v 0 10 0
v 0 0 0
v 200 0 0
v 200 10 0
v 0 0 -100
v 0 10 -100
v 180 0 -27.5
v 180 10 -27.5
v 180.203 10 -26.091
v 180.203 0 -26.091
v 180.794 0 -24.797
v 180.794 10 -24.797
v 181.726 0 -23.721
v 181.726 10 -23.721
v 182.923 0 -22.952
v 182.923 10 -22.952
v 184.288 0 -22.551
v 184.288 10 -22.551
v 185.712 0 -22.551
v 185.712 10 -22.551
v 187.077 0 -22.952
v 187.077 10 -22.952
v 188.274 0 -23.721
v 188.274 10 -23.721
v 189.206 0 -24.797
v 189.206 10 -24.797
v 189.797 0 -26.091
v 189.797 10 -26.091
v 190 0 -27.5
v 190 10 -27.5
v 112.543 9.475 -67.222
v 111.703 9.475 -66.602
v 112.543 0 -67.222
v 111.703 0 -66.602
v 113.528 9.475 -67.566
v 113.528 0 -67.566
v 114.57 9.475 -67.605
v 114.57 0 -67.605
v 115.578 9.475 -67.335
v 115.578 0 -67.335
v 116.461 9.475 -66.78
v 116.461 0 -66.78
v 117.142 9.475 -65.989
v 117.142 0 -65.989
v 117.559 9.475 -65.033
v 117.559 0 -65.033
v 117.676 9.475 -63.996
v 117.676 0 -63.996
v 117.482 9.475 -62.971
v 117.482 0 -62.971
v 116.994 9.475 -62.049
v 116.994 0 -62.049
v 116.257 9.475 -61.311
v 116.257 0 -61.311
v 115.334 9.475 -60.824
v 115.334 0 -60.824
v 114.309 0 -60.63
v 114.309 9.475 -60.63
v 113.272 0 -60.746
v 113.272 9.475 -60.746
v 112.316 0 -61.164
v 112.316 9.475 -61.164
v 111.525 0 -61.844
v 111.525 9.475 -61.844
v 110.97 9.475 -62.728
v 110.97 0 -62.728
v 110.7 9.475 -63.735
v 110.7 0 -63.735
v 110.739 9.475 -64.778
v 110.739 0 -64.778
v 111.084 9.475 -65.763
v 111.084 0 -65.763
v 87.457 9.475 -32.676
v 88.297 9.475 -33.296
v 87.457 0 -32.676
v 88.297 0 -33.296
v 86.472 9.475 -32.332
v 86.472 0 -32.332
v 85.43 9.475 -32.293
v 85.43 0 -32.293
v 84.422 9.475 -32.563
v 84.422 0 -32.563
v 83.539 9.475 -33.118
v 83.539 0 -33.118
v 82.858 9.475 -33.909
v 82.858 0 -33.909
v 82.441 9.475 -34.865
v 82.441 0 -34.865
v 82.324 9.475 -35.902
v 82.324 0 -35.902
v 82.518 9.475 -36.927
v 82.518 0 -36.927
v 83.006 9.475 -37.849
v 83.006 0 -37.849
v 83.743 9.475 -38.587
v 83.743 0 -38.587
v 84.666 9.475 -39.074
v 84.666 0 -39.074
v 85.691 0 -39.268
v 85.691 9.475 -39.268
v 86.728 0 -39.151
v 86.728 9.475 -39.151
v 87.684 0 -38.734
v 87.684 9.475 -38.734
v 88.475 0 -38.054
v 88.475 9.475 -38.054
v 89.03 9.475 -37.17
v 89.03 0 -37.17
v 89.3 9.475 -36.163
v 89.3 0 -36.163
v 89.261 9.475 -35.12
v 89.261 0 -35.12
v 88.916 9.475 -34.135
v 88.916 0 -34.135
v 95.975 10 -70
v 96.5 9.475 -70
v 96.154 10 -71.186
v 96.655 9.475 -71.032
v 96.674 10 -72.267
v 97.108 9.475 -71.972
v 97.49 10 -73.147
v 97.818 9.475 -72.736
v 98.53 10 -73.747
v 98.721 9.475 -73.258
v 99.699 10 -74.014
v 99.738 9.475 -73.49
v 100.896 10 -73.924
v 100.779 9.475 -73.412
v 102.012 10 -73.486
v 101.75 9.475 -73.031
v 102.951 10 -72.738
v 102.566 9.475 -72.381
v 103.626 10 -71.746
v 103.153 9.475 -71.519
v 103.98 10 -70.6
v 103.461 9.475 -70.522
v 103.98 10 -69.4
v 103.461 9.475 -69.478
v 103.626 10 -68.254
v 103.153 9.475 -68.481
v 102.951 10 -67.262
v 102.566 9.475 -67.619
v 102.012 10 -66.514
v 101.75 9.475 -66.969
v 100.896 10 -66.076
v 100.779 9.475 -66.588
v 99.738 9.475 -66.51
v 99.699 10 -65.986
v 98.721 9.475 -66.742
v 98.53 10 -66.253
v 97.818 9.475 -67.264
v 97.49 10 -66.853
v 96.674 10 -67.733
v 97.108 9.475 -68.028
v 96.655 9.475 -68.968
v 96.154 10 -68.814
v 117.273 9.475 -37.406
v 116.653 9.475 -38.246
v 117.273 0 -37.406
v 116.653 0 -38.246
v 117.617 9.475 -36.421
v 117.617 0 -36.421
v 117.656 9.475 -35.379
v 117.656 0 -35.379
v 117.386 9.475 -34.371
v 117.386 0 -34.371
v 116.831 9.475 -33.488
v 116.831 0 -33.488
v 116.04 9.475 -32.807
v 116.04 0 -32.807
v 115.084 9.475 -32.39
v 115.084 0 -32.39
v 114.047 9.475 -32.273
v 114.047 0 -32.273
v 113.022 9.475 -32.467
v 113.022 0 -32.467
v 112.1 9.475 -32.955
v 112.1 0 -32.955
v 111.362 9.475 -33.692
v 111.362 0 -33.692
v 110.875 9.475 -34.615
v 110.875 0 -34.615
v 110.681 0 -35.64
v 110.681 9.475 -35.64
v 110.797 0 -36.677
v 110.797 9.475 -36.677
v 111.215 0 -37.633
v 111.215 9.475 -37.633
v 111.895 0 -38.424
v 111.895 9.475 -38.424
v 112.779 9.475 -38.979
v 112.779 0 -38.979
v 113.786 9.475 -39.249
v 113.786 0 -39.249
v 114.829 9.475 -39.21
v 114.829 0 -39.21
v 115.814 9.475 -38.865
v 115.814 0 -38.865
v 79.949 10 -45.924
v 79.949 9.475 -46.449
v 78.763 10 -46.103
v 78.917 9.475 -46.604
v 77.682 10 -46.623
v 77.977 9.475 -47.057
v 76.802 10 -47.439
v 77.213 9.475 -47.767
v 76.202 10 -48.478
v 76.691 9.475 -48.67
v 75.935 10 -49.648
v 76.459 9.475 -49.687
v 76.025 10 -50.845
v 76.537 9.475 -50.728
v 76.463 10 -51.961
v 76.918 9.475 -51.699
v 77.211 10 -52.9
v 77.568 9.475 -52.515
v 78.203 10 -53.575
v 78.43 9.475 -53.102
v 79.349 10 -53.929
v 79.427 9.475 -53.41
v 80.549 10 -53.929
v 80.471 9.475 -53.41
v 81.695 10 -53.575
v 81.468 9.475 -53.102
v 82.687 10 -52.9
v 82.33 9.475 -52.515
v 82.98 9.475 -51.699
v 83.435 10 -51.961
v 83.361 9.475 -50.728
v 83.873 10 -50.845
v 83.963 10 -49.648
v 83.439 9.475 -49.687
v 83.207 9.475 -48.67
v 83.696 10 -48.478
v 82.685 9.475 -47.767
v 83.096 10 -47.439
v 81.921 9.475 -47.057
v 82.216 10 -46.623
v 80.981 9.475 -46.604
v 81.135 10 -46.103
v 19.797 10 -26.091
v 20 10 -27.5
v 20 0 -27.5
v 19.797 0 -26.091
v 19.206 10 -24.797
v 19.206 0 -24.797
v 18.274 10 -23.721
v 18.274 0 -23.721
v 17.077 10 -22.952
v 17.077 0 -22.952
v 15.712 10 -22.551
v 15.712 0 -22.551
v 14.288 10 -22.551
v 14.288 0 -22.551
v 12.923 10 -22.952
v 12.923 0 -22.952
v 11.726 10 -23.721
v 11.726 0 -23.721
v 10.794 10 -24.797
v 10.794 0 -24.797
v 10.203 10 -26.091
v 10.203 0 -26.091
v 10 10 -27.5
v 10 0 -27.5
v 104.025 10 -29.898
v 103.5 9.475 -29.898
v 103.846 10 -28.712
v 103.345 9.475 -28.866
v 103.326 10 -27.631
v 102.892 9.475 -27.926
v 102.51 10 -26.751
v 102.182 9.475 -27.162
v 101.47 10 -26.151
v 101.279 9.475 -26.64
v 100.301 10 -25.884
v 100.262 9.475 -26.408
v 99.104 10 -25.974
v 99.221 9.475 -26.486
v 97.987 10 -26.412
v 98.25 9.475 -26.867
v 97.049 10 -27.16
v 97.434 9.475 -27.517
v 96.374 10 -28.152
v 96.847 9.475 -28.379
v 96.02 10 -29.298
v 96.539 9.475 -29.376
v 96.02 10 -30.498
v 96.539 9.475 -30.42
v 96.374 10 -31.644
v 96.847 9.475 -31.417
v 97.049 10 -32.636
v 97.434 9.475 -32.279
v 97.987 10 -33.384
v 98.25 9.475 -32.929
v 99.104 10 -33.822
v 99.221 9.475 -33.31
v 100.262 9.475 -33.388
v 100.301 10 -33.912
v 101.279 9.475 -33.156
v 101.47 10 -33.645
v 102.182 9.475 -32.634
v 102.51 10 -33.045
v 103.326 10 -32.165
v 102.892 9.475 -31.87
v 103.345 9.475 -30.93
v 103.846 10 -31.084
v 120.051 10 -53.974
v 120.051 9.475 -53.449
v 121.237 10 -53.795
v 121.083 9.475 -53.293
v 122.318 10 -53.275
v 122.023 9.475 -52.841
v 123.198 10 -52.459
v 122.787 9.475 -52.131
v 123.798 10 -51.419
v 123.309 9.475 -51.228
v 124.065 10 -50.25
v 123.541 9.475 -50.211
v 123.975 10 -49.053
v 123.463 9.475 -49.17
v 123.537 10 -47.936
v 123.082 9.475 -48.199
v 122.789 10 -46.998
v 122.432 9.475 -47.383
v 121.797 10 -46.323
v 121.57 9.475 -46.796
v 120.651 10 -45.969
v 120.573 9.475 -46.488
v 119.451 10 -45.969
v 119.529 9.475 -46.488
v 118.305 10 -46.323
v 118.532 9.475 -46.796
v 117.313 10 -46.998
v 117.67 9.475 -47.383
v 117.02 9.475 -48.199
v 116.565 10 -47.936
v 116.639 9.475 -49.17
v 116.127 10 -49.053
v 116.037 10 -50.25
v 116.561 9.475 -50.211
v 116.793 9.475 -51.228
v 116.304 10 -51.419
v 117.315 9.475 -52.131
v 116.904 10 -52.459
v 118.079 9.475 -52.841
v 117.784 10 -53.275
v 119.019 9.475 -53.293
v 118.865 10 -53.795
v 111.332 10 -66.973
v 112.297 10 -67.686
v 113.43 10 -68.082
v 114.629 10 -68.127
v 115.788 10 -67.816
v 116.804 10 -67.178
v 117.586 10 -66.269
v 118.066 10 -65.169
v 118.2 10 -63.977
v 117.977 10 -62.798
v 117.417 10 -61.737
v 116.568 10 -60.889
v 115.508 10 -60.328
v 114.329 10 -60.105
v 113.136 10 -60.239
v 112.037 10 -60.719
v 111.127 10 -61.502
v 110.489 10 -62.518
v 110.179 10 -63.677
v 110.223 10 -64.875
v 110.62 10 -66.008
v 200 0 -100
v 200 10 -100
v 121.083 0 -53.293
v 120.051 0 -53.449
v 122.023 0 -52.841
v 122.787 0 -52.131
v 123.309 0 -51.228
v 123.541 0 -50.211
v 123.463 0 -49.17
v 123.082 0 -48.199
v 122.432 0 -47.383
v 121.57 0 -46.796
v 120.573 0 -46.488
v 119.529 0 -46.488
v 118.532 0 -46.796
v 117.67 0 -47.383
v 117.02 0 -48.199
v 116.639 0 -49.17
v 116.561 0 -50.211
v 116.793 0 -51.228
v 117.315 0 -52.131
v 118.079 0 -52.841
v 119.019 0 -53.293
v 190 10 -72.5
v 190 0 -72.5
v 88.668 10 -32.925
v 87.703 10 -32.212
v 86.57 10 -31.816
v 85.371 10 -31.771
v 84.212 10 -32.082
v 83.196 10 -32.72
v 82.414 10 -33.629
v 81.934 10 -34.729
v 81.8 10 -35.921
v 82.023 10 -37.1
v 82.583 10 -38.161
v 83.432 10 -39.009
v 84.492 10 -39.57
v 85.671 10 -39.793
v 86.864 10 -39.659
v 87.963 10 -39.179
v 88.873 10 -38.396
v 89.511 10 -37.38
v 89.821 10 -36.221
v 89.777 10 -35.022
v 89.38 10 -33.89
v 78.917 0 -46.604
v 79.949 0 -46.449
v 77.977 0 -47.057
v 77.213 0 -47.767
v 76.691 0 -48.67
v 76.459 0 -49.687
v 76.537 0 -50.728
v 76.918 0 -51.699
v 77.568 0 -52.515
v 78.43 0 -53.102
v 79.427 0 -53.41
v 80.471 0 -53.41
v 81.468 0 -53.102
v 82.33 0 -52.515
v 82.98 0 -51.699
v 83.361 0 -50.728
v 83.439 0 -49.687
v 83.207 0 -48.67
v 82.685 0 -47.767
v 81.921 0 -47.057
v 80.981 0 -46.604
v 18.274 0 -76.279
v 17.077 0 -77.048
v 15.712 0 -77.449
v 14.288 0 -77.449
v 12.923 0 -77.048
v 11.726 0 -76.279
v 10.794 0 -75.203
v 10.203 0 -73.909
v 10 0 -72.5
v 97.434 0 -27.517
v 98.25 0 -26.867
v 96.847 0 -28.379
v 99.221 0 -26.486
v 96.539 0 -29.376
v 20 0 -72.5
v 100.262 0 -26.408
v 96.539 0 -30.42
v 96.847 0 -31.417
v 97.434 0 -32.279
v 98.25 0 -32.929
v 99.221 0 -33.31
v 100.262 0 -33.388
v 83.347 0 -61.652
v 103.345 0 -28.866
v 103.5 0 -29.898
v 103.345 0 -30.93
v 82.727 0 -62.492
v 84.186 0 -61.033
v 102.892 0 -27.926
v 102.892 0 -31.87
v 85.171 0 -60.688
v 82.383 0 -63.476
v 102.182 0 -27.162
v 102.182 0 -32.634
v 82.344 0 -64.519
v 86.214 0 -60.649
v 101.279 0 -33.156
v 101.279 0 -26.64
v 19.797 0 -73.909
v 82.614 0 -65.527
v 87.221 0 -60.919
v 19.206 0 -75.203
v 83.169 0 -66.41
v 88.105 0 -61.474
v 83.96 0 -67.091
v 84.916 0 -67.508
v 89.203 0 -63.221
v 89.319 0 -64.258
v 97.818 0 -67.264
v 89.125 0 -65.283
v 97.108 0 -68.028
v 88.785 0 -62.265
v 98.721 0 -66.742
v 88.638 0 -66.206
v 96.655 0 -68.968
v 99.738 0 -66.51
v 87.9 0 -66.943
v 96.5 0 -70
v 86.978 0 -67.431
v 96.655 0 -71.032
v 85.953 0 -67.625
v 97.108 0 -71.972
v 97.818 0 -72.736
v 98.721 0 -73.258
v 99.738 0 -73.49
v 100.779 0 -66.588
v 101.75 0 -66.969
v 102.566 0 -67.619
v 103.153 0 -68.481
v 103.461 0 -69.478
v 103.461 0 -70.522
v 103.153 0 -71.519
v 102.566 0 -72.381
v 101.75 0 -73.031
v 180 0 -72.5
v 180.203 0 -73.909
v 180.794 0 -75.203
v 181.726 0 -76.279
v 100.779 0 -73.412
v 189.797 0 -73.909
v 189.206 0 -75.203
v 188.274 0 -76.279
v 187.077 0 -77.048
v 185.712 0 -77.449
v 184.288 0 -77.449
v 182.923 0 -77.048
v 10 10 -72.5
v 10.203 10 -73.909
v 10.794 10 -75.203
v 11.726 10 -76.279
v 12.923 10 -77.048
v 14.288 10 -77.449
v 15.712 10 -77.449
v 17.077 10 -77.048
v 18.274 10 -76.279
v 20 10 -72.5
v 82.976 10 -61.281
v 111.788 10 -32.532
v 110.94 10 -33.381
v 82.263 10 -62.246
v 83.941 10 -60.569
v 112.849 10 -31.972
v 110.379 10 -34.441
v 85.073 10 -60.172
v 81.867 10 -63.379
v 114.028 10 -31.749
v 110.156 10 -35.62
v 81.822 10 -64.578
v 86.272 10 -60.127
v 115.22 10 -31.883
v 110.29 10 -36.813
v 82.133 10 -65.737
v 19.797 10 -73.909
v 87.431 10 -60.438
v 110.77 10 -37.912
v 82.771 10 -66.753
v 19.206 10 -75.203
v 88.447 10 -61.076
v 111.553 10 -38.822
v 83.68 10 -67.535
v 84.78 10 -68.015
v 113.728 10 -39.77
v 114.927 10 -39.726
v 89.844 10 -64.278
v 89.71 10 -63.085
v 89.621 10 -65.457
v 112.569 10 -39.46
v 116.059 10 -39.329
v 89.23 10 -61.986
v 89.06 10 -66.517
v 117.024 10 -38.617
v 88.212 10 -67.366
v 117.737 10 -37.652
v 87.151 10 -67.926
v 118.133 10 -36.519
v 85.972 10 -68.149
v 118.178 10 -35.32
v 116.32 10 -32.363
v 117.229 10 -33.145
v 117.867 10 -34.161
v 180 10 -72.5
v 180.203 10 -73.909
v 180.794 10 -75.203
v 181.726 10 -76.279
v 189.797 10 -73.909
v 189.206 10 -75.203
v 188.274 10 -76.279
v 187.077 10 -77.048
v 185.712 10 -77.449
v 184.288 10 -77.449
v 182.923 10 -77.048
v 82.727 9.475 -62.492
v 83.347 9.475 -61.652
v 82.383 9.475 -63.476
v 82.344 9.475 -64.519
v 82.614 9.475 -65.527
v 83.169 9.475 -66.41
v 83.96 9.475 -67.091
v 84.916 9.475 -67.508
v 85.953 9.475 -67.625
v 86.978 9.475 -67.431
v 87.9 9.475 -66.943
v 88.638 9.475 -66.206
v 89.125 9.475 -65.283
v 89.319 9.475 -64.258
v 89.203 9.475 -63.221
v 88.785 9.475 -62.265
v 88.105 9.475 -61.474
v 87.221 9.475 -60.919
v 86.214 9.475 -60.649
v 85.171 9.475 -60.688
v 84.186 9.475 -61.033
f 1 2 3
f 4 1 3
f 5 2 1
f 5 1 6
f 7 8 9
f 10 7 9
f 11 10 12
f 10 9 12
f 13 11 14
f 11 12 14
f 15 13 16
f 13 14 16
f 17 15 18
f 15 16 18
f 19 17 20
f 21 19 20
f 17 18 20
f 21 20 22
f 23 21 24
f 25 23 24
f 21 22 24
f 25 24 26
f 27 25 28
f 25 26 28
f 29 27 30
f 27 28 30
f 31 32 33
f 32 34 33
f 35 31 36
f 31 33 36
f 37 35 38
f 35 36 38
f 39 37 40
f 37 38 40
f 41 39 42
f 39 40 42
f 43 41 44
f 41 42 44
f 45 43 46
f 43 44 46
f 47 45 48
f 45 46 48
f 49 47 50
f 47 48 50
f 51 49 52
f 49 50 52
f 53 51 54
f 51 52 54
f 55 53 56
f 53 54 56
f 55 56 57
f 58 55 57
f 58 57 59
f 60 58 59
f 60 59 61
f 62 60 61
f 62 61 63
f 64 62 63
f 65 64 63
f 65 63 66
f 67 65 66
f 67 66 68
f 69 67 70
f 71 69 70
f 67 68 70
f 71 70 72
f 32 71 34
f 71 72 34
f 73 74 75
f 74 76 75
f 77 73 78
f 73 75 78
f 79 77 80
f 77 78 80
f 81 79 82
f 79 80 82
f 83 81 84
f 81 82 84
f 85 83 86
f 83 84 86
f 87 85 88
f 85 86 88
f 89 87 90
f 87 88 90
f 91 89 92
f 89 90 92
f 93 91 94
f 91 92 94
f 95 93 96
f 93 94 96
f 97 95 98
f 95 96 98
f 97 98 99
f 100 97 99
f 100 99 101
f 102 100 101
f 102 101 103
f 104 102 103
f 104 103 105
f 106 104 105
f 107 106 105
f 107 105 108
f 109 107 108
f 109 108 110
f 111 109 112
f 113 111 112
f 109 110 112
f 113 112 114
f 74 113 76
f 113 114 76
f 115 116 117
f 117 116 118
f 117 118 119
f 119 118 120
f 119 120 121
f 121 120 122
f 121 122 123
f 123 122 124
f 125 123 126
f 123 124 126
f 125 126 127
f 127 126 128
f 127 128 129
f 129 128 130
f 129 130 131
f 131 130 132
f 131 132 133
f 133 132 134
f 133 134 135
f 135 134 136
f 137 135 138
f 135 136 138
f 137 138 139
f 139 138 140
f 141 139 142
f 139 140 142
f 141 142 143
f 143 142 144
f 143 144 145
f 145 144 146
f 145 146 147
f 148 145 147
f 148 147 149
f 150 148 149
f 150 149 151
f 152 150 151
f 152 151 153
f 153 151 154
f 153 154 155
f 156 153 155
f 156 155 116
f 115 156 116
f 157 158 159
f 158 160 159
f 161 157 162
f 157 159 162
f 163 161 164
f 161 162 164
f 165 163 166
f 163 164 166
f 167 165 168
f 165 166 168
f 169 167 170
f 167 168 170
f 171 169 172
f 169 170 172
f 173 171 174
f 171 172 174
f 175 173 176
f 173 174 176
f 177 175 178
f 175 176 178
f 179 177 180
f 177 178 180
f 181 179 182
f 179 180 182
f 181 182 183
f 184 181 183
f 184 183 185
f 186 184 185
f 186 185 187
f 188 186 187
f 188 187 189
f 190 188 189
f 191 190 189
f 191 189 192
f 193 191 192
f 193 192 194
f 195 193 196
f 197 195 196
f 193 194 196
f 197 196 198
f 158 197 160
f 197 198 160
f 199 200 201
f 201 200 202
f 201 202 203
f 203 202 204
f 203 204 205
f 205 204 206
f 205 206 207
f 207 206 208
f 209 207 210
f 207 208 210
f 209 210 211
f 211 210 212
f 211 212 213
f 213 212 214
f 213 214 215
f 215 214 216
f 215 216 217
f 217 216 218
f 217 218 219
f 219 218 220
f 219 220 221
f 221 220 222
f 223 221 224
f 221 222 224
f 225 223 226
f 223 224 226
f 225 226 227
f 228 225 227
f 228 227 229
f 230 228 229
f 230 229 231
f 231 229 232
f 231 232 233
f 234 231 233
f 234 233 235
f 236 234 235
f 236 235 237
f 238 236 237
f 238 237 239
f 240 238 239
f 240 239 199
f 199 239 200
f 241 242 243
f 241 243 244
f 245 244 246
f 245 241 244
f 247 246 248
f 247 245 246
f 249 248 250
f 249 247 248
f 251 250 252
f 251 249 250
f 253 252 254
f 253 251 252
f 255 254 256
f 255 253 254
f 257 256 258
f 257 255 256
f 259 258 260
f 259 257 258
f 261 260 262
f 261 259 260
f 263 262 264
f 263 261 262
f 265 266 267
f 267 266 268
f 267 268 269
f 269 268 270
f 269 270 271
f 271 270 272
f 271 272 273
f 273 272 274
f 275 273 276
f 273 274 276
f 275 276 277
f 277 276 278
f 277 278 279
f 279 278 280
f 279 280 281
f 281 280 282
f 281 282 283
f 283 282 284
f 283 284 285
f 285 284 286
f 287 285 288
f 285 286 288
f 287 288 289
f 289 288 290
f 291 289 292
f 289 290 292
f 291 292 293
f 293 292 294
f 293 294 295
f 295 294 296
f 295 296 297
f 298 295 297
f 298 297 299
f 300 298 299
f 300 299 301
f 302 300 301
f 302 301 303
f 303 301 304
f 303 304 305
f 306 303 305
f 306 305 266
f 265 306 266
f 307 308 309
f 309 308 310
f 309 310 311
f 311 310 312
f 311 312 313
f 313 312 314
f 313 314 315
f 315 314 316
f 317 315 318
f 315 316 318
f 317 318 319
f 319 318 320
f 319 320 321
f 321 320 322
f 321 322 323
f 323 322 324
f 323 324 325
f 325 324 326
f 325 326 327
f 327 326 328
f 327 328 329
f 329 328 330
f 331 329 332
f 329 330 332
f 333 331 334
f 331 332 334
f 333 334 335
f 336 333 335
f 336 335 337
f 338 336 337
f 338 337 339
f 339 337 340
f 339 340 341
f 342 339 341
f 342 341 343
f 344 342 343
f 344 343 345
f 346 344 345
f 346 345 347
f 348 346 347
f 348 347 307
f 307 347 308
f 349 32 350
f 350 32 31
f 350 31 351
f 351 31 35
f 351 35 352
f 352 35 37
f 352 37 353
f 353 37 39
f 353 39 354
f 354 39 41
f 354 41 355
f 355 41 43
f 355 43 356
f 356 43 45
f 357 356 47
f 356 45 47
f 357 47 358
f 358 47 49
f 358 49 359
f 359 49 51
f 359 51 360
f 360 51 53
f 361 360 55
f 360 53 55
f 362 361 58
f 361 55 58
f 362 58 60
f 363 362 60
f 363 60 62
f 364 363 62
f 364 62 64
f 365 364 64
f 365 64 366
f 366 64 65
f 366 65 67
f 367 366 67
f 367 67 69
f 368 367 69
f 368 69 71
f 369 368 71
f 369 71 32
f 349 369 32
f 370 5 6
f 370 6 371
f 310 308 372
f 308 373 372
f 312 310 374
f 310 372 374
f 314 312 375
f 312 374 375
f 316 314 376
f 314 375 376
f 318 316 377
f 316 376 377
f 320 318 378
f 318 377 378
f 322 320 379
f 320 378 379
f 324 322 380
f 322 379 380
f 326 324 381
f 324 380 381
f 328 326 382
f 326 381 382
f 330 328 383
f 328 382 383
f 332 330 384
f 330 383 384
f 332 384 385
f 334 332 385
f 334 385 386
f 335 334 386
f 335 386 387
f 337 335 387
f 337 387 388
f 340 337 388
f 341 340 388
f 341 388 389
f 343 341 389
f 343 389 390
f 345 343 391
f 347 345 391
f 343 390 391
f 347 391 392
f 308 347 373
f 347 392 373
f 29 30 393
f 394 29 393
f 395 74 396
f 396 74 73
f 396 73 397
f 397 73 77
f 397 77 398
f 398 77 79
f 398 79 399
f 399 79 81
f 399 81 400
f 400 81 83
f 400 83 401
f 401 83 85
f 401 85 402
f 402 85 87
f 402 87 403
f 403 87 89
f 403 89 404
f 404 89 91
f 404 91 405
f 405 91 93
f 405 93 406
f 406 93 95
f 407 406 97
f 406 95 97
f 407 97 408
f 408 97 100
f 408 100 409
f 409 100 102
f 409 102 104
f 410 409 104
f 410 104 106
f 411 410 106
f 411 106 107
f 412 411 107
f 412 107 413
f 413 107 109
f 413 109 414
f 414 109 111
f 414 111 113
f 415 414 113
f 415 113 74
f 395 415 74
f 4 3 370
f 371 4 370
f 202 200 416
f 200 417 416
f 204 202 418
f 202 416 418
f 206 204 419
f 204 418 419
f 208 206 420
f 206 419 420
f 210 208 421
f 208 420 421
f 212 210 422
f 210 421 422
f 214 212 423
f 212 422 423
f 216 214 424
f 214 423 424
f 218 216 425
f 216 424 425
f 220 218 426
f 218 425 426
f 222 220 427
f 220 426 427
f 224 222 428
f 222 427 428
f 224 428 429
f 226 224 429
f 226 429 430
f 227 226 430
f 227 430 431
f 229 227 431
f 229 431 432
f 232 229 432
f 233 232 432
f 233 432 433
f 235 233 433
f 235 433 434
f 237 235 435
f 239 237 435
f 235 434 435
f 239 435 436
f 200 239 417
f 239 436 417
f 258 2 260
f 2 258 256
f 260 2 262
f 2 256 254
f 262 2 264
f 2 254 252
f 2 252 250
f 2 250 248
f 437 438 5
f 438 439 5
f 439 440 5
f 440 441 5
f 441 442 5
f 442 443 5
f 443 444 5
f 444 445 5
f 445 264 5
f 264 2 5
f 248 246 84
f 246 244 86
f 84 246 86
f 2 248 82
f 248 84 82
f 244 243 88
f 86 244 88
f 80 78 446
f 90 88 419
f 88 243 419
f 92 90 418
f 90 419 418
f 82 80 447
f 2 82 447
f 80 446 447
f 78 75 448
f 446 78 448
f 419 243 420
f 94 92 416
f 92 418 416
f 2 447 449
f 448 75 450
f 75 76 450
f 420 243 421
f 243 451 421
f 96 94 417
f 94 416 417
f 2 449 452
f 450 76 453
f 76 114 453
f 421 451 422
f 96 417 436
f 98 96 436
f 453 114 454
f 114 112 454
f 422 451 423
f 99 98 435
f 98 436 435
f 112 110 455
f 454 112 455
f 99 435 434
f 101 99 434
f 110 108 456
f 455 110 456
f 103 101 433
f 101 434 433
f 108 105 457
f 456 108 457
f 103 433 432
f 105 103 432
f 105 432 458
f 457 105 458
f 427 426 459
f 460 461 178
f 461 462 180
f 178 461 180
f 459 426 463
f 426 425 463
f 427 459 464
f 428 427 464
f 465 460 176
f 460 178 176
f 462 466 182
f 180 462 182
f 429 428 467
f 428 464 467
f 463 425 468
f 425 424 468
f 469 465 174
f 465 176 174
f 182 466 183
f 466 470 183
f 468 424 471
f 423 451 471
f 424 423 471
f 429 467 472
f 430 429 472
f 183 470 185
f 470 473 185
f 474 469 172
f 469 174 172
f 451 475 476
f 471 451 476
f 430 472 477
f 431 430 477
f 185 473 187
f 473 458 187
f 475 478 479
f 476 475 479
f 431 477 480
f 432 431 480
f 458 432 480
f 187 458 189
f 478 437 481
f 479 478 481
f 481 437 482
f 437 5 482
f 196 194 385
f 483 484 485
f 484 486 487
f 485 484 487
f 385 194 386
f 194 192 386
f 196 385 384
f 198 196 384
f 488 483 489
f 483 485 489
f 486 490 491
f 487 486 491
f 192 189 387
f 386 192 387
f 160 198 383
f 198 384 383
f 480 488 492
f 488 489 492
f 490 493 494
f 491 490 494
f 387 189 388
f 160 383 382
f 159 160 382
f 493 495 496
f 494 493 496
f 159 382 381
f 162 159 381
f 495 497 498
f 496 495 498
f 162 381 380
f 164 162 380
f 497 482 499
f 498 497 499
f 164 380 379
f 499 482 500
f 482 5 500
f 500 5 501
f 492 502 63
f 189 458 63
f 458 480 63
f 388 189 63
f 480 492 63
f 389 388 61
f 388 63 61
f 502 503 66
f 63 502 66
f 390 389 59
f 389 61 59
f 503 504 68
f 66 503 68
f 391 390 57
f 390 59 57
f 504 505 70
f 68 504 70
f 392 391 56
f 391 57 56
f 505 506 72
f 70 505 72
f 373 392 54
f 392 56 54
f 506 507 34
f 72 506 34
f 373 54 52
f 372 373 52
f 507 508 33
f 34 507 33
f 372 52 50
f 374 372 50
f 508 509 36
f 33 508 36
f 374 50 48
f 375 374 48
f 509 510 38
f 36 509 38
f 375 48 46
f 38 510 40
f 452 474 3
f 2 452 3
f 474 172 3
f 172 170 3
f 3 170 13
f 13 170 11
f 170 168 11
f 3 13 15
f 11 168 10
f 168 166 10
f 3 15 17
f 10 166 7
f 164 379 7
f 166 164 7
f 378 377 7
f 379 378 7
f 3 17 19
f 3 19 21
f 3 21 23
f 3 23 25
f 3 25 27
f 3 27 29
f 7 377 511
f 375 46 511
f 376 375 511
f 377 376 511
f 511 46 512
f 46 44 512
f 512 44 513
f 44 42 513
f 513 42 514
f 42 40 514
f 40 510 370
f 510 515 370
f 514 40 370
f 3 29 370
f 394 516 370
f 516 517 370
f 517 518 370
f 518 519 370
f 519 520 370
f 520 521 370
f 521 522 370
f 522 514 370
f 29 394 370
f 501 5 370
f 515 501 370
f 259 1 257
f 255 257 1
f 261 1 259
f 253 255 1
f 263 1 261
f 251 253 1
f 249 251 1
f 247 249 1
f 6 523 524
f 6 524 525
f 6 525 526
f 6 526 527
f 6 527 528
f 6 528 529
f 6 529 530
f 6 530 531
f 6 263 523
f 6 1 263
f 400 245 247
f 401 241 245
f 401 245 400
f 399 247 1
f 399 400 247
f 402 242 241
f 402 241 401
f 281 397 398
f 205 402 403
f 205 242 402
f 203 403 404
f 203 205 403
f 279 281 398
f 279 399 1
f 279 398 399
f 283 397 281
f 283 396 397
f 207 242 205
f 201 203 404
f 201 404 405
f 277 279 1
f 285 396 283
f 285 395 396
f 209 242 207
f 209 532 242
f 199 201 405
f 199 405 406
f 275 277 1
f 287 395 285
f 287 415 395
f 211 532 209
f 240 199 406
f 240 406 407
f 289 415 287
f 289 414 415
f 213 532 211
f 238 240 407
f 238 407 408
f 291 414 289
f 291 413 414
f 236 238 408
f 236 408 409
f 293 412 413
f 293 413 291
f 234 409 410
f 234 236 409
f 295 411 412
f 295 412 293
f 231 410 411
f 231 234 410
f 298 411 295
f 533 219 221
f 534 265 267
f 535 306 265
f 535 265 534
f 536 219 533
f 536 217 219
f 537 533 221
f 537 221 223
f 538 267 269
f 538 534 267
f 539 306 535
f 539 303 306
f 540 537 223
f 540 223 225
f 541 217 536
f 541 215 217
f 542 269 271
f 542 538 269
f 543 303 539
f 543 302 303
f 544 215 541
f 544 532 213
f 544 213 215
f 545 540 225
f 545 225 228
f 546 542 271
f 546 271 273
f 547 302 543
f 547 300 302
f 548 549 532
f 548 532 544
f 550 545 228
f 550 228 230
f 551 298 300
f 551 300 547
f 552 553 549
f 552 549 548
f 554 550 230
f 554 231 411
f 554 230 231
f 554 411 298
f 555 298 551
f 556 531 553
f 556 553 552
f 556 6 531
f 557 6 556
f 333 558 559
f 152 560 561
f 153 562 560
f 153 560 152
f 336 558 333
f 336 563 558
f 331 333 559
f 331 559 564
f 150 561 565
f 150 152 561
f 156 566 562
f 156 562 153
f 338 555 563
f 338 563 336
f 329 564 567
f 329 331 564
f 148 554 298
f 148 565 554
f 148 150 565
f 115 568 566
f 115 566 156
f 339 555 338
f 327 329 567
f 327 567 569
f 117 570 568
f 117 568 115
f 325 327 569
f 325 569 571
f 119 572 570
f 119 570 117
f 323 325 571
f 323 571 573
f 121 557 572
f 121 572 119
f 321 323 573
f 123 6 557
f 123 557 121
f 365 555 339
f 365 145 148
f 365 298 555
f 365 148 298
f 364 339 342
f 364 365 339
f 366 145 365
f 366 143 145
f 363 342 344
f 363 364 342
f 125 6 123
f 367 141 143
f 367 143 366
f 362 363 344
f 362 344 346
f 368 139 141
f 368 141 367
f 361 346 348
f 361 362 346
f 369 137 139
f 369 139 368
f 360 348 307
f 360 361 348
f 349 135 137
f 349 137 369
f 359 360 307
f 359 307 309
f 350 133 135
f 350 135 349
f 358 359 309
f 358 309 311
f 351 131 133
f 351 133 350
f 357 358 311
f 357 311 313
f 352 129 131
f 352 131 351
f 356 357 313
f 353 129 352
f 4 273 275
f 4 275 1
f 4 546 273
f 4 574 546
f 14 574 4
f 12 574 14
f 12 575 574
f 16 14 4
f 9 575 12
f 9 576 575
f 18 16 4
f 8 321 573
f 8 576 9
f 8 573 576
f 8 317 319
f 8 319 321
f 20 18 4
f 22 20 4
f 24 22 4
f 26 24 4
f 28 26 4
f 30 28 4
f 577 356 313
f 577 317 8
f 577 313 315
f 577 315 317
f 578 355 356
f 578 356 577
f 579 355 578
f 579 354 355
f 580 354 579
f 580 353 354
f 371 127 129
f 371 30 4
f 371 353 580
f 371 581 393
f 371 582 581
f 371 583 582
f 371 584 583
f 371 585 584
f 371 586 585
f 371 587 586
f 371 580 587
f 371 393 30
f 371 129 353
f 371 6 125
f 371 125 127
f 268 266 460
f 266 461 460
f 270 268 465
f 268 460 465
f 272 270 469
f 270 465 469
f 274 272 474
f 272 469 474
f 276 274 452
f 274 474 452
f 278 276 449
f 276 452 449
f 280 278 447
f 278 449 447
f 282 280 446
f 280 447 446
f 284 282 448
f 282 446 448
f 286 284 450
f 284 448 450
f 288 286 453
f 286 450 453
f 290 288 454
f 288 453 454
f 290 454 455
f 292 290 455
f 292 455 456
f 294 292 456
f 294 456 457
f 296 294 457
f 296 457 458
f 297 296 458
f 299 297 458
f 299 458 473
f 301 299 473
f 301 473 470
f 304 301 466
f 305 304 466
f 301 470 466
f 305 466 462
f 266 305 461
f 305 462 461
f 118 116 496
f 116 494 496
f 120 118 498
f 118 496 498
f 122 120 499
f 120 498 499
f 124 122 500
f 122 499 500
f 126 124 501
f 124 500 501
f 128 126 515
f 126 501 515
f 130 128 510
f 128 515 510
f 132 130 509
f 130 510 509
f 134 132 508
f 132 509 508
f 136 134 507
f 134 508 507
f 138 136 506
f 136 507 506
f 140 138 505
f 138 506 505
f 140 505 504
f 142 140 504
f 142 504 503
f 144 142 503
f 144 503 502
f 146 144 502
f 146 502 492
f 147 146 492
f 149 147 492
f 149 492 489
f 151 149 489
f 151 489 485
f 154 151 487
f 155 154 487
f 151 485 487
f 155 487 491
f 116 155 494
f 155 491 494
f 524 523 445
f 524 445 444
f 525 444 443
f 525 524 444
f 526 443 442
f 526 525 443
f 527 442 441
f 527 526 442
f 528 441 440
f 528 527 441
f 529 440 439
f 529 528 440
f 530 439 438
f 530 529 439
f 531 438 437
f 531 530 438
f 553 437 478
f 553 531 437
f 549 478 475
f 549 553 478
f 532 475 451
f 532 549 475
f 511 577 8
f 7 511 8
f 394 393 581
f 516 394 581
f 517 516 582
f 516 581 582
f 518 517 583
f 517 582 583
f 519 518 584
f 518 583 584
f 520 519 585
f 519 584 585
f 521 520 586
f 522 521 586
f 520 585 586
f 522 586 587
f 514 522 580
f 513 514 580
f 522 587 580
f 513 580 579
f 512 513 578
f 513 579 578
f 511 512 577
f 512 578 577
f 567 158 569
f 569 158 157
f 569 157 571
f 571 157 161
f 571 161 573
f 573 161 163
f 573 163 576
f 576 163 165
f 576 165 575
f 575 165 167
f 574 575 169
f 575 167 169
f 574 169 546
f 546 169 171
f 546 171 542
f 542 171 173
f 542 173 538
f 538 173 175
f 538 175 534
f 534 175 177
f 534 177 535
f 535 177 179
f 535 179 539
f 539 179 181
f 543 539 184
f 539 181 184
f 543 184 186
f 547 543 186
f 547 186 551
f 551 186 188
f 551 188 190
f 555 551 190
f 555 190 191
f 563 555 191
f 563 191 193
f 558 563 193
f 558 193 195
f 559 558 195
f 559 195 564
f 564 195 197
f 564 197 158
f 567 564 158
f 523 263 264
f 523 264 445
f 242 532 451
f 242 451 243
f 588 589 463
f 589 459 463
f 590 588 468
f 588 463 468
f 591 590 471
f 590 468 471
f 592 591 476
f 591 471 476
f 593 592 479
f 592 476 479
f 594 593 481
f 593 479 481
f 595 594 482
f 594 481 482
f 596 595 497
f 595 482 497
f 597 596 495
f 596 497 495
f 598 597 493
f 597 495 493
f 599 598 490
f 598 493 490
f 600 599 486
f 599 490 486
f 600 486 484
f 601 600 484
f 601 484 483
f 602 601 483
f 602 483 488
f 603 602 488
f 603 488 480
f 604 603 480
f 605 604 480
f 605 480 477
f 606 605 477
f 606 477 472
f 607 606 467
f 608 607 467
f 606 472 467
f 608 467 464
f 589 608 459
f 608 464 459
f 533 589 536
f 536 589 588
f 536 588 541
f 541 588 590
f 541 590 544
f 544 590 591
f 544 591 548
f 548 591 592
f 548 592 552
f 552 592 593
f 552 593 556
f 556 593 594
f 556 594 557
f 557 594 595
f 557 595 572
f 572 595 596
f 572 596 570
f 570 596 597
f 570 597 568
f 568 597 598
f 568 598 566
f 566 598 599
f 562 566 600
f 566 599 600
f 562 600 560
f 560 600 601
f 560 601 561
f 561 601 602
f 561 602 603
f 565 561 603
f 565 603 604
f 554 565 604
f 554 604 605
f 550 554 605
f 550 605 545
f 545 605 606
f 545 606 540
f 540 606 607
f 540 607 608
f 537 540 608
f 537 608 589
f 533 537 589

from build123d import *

# Parameters (mm, degrees)
SKETCH2_W                       = 200
SKETCH2_H                       = 100
BOSS_EXTRUDE2_DEPTH             = 10
M8X1_0_TAPPED_HOLE1_D           = 7
M8X1_0_TAPPED_HOLE1_CSINK_D     = 8.05
M8X1_0_TAPPED_HOLE1_CSINK_ANGLE = 90
CIRPATTERN1_COUNT               = 8
CUT_EXTRUDE1_DEPTH              = 224.830292856


with BuildPart() as part:
    # Sketch2 → Boss-Extrude2 (new body)
    with BuildSketch(Plane(origin=(0, 0, 0), x_dir=(1, 0, 0), z_dir=(0, 1, 0))):
        with Locations((100, 50)):
            Rectangle(SKETCH2_W, SKETCH2_H)
    extrude(amount=BOSS_EXTRUDE2_DEPTH)

    # M8x1.0 Tapped Hole1 (through all)
    with Locations(Plane(origin=(0, 10, 0), x_dir=(1, 0, 0), z_dir=(0, 1, 0))):
        with Locations((100, 70)):
            m8x1_0_tapped_hole1 = CounterSinkHole(M8X1_0_TAPPED_HOLE1_D / 2, M8X1_0_TAPPED_HOLE1_CSINK_D / 2, counter_sink_angle=M8X1_0_TAPPED_HOLE1_CSINK_ANGLE)

    # CirPattern1: M8x1.0 Tapped Hole1 ×8 about axis
    cirpattern1_axis = Axis((100, 0, -49.948974386), (0, 1, 0))
    for i in range(1, CIRPATTERN1_COUNT):
        add(m8x1_0_tapped_hole1.rotate(cirpattern1_axis, i * 360 / CIRPATTERN1_COUNT), mode=Mode.SUBTRACT)

    # Sketch6 → Cut-Extrude1 (cut, through all)
    with BuildSketch(Plane(origin=(0, 10, 0), x_dir=(1, 0, 0), z_dir=(0, 1, 0))):
        with BuildLine():
            Line((20, 72.5), (20, 27.5))
            ThreePointArc((20, 27.5), (15, 22.5), (10, 27.5))
            Line((10, 27.5), (10, 72.5))
            ThreePointArc((10, 72.5), (15, 77.5), (20, 72.5))
        make_face()
        with BuildLine():
            Line((180, 72.5), (180, 27.5))
            ThreePointArc((180, 27.5), (185, 22.5), (190, 27.5))
            Line((190, 27.5), (190, 72.5))
            ThreePointArc((190, 72.5), (185, 77.5), (180, 72.5))
        make_face()
    extrude(amount=-CUT_EXTRUDE1_DEPTH, mode=Mode.SUBTRACT)


solid = part.part
